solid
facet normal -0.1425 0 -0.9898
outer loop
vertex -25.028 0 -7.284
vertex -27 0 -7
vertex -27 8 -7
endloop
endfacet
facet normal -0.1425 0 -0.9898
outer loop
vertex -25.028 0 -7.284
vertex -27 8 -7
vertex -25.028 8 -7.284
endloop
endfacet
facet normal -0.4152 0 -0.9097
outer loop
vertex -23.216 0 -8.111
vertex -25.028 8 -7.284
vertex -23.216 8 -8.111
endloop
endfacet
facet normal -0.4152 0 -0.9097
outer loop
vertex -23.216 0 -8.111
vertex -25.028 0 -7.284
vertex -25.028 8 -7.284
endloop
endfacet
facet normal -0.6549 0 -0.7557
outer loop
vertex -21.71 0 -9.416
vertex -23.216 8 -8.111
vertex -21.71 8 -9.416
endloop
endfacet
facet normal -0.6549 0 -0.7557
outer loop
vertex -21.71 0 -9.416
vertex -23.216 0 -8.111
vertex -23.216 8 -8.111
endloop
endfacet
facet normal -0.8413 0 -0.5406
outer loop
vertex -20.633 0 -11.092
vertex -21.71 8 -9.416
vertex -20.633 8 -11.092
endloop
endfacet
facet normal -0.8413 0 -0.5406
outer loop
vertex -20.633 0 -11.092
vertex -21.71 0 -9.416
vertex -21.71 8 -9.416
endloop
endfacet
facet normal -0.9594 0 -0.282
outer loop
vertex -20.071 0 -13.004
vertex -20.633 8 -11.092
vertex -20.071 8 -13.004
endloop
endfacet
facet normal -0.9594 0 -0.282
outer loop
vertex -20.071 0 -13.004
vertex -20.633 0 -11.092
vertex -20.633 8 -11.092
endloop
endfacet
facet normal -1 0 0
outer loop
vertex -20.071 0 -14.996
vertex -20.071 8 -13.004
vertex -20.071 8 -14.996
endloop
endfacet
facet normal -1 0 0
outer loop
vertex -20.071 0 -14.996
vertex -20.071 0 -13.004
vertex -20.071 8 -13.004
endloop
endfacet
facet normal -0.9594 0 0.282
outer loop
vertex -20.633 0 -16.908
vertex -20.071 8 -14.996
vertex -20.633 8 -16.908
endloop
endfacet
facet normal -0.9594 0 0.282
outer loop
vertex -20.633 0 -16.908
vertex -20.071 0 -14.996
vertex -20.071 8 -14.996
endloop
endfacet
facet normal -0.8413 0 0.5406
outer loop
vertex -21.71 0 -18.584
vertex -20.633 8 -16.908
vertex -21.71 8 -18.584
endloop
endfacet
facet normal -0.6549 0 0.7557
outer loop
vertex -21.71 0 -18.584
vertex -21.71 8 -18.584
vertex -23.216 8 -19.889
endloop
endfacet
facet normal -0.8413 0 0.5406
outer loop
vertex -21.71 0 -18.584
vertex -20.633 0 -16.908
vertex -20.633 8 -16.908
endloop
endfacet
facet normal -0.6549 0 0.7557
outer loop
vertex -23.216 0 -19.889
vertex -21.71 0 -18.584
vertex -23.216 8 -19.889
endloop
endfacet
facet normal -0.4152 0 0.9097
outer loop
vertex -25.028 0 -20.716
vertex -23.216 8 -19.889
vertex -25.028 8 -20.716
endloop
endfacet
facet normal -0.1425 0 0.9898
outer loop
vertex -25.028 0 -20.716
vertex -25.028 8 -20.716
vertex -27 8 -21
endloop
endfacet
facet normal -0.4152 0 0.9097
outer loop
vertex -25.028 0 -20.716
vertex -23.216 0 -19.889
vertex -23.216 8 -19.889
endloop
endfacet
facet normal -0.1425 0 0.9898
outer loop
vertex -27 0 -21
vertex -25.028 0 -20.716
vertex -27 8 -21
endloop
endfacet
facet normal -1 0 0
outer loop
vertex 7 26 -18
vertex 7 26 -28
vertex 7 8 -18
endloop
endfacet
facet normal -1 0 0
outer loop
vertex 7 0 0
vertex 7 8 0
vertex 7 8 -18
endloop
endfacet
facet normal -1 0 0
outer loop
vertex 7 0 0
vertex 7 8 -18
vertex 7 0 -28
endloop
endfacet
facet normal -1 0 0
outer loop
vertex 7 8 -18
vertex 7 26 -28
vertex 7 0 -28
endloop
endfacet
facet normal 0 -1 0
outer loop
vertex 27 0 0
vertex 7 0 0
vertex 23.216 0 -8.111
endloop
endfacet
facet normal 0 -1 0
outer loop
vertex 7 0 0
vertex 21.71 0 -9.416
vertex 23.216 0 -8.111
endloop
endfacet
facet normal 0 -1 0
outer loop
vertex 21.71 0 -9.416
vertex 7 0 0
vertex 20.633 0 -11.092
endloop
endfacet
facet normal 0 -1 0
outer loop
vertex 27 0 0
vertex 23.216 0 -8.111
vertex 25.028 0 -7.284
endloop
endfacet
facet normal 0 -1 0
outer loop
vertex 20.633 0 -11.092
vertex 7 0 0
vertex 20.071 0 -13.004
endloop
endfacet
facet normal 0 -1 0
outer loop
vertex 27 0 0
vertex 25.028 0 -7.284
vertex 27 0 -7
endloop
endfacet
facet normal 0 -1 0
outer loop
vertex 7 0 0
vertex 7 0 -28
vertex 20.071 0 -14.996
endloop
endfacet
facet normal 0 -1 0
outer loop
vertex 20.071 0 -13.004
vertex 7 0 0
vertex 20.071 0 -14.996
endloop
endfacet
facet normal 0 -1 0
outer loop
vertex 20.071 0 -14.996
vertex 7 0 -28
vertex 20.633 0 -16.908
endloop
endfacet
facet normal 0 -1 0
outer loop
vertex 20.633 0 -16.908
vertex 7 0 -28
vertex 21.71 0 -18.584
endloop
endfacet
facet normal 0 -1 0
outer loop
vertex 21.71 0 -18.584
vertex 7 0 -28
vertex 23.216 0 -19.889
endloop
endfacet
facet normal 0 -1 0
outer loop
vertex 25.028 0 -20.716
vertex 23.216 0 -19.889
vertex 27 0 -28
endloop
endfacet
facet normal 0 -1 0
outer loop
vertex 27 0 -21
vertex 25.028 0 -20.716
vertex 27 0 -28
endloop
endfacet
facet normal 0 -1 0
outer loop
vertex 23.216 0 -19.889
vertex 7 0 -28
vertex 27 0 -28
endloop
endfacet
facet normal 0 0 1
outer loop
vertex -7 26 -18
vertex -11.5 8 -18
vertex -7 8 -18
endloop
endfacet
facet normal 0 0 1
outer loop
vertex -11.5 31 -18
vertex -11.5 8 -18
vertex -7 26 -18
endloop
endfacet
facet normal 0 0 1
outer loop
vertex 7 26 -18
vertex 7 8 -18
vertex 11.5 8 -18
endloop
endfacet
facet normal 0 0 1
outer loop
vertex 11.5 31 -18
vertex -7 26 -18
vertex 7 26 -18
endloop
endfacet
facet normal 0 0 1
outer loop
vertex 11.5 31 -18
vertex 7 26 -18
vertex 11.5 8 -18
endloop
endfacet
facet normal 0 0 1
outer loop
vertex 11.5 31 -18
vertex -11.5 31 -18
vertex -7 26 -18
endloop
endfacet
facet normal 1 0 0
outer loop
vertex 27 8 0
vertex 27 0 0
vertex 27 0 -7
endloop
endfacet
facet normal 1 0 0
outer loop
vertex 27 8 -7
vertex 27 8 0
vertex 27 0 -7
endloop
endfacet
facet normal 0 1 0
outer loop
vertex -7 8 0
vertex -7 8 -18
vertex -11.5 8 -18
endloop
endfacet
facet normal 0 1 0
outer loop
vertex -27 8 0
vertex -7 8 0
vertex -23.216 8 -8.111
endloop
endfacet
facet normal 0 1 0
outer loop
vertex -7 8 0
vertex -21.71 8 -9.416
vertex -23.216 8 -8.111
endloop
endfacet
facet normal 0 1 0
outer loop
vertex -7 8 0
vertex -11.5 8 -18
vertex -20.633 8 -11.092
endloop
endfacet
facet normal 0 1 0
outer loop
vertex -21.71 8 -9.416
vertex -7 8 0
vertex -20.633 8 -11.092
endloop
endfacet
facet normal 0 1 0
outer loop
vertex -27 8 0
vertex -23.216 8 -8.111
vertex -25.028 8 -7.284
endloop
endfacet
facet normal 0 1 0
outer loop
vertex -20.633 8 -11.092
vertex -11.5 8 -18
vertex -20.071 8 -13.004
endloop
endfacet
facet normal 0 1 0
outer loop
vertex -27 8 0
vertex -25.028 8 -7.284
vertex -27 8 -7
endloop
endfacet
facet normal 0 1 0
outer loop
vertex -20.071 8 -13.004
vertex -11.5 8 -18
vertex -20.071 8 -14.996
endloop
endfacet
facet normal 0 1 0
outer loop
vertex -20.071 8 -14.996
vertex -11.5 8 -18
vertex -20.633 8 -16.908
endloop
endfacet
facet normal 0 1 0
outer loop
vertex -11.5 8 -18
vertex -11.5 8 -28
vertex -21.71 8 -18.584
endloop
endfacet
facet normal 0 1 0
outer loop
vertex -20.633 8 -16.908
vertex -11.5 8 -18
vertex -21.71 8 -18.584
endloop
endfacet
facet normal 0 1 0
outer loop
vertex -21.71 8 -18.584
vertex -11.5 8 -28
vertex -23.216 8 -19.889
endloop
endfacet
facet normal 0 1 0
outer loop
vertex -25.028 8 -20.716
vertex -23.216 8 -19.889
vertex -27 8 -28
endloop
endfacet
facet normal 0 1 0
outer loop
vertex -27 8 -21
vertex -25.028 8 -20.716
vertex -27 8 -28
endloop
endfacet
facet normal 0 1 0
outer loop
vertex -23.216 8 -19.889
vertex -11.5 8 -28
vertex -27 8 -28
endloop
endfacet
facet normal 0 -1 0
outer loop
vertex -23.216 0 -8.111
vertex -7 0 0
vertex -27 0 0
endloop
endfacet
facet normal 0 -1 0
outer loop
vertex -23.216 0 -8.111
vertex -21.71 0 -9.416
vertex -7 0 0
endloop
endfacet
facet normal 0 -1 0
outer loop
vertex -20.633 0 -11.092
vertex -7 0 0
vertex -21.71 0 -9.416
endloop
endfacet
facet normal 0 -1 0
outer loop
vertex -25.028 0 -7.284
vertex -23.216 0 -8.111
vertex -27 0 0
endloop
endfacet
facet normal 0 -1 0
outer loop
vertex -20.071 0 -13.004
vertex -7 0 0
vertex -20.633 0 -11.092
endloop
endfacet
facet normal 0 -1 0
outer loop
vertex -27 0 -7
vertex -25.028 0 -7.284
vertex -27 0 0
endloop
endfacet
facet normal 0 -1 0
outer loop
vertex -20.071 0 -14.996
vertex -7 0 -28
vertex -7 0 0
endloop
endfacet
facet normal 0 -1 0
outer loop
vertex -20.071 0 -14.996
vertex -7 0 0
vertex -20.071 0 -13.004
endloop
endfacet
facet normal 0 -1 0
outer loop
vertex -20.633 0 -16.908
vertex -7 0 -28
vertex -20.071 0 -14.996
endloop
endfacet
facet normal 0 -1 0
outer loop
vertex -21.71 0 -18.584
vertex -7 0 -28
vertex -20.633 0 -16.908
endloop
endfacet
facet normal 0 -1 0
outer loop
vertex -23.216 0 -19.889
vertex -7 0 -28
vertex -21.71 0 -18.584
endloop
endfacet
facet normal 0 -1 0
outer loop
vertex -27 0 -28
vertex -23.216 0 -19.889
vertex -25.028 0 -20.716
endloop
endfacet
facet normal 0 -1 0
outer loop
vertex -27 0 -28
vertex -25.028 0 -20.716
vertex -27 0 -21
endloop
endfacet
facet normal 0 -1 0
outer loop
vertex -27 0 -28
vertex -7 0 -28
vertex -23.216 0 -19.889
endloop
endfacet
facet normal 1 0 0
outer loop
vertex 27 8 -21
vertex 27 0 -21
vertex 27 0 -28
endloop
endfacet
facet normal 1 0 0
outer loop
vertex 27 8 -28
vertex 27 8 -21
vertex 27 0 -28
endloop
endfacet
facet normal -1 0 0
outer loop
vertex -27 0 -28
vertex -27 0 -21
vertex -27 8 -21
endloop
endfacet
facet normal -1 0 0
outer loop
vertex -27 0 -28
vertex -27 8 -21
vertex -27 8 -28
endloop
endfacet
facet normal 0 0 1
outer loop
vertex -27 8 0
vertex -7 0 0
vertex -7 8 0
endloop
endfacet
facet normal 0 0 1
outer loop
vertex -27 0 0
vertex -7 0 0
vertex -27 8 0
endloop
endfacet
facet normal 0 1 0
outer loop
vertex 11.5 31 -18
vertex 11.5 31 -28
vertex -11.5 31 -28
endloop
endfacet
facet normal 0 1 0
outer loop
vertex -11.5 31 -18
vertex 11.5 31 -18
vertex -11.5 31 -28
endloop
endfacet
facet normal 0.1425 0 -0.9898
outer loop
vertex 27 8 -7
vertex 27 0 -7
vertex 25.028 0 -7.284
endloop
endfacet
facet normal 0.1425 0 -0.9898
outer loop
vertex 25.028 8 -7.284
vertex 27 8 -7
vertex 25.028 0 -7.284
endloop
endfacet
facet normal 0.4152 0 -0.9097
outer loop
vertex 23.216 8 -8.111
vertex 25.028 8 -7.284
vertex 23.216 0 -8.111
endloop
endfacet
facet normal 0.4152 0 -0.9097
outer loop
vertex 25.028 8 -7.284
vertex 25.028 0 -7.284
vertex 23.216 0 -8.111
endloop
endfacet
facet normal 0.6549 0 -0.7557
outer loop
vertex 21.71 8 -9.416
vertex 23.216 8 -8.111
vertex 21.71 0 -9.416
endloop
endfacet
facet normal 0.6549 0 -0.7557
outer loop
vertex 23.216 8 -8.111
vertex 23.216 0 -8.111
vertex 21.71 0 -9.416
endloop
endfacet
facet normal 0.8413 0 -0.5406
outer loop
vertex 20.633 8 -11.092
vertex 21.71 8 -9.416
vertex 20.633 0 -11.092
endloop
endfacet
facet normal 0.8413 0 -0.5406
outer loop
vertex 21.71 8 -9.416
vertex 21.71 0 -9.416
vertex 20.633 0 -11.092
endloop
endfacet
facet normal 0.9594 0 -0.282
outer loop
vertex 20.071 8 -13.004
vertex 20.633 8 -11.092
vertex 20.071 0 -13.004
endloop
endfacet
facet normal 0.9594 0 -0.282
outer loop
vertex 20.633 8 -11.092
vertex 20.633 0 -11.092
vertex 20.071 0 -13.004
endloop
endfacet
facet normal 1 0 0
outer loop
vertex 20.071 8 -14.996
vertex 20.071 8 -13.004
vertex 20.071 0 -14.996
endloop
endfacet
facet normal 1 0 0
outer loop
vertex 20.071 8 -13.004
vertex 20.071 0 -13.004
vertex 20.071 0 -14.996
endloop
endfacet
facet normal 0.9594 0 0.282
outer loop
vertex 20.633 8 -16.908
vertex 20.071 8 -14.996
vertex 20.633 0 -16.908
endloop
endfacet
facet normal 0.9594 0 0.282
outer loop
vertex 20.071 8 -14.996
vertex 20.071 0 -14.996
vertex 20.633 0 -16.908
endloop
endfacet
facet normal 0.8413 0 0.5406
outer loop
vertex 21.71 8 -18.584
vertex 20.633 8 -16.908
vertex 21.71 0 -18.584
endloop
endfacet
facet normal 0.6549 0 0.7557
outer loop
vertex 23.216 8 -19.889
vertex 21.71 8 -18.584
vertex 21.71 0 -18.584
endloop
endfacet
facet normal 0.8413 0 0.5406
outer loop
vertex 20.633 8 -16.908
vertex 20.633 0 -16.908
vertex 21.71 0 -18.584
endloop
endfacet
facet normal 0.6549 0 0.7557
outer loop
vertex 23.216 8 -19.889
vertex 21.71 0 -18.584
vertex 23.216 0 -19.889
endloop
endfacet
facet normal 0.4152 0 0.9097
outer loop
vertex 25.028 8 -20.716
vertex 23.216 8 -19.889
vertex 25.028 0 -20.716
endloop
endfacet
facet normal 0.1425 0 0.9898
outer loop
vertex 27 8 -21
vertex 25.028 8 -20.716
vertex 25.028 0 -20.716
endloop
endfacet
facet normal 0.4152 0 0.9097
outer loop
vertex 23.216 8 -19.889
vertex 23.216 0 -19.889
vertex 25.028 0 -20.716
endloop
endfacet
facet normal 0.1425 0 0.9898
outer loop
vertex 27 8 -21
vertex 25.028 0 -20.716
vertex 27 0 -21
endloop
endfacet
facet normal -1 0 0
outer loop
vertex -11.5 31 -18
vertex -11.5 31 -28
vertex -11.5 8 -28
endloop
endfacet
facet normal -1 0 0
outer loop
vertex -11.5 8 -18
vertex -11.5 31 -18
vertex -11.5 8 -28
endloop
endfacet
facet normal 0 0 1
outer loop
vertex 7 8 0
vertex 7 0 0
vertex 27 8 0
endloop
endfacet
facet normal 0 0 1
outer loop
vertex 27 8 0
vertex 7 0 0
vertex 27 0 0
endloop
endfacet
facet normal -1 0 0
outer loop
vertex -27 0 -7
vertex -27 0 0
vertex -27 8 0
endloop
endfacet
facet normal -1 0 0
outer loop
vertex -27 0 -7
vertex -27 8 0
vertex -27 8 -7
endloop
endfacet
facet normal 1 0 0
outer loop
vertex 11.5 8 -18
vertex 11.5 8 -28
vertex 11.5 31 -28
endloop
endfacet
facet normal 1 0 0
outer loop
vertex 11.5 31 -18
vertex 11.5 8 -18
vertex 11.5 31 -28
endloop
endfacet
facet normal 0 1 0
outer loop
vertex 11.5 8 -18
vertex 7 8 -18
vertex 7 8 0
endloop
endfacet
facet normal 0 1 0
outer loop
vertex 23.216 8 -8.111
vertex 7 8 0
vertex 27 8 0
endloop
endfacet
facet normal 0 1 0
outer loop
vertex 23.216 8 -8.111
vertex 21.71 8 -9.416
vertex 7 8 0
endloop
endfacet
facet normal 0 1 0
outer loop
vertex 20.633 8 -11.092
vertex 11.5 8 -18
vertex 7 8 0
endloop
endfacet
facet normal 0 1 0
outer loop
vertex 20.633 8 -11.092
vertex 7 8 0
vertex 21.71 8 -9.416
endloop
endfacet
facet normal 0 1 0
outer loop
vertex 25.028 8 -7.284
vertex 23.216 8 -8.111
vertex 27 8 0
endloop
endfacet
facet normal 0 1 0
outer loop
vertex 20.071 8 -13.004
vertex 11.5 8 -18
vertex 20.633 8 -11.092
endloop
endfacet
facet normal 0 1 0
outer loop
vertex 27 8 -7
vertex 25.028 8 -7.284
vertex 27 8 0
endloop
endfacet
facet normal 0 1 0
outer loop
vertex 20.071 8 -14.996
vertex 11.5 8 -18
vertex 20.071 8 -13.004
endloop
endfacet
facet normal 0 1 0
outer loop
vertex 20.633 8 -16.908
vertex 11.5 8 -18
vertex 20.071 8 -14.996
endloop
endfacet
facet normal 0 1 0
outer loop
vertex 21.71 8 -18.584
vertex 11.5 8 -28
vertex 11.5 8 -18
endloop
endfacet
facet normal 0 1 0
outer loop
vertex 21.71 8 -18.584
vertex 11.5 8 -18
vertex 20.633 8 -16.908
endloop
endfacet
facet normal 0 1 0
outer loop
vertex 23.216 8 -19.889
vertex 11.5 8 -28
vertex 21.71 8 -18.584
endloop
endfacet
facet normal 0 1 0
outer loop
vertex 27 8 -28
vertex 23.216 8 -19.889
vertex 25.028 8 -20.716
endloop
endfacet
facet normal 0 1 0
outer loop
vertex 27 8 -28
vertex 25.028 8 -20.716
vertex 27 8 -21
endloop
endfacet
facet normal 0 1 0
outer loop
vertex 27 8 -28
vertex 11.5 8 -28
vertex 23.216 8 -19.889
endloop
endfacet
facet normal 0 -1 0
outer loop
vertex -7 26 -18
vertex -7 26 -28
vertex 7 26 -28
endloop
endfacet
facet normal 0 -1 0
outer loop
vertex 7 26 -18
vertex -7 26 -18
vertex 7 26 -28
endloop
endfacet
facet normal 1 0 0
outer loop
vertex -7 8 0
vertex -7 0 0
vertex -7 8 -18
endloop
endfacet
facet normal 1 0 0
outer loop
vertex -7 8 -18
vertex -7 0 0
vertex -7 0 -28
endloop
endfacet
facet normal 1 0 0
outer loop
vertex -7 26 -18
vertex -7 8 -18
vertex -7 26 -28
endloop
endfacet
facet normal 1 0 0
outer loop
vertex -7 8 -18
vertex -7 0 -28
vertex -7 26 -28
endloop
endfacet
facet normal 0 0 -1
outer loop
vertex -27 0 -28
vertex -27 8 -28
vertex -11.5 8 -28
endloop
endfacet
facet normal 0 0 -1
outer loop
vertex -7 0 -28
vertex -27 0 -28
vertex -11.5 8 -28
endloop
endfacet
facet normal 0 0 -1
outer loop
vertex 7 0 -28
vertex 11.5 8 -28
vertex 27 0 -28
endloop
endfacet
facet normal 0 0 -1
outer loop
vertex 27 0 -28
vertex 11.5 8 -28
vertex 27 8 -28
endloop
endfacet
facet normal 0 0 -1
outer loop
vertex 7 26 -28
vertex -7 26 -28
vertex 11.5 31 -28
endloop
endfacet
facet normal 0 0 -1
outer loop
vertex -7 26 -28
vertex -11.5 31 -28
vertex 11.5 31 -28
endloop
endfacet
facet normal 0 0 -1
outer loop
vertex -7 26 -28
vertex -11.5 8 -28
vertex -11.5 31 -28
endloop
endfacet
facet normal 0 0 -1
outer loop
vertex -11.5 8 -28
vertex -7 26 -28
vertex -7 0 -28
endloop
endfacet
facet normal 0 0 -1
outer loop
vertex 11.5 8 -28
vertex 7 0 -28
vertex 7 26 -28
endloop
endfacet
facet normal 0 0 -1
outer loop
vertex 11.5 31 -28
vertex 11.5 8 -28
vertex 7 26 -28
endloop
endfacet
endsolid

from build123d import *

# Parameters (mm, degrees)
EXTRUDE_1_DEPTH   = 8
EXTRUDE_1_2_DEPTH = 8
EXTRUDE_2_DEPTH   = 10


with BuildPart() as part:
    # 草图1 → 凸台-拉伸1 (new body)
    with BuildSketch(Plane(origin=(0, 0, 0), x_dir=(1, 0, 0), z_dir=(0, 1, 0))):
        with BuildLine():
            Line((27, 21), (27, 28))
            Line((27, 28), (7, 28))
            Line((7, 28), (7, 0))
            Line((7, 0), (27, 0))
            Line((27, 0), (27, 7))
            ThreePointArc((27, 7), (20, 14), (27, 21))
        make_face()
    extrude(amount=EXTRUDE_1_DEPTH)



with BuildPart() as body_2:
    # 草图1 → Extrude 1 2 (new body)
    with BuildSketch(Plane(origin=(0, 0, 0), x_dir=(1, 0, 0), z_dir=(0, 1, 0))):
        with BuildLine():
            Line((-27, 0), (-27, 7))
            ThreePointArc((-27, 7), (-20, 14), (-27, 21))
            Line((-27, 21), (-27, 28))
            Line((-27, 28), (-7, 28))
            Line((-7, 28), (-7, 0))
            Line((-7, 0), (-27, 0))
        make_face()
    extrude(amount=EXTRUDE_1_2_DEPTH)


with BuildPart() as part_1:
    add(part.part)

    add(body_2.part)  # 凸台-拉伸2 merges body 2
    # 草图2 → 凸台-拉伸2 (add)
    with BuildSketch(Plane(origin=(0, 0, -28), x_dir=(-1, 0, 0), z_dir=(0, 0, -1))):
        Polygon((-11.5, 31), (11.5, 31), (11.5, 8), (7, 8), (7, 26), (-7, 26), (-7, 8), (-11.5, 8), align=None)
    extrude(amount=-EXTRUDE_2_DEPTH)


solid = part_1.part
